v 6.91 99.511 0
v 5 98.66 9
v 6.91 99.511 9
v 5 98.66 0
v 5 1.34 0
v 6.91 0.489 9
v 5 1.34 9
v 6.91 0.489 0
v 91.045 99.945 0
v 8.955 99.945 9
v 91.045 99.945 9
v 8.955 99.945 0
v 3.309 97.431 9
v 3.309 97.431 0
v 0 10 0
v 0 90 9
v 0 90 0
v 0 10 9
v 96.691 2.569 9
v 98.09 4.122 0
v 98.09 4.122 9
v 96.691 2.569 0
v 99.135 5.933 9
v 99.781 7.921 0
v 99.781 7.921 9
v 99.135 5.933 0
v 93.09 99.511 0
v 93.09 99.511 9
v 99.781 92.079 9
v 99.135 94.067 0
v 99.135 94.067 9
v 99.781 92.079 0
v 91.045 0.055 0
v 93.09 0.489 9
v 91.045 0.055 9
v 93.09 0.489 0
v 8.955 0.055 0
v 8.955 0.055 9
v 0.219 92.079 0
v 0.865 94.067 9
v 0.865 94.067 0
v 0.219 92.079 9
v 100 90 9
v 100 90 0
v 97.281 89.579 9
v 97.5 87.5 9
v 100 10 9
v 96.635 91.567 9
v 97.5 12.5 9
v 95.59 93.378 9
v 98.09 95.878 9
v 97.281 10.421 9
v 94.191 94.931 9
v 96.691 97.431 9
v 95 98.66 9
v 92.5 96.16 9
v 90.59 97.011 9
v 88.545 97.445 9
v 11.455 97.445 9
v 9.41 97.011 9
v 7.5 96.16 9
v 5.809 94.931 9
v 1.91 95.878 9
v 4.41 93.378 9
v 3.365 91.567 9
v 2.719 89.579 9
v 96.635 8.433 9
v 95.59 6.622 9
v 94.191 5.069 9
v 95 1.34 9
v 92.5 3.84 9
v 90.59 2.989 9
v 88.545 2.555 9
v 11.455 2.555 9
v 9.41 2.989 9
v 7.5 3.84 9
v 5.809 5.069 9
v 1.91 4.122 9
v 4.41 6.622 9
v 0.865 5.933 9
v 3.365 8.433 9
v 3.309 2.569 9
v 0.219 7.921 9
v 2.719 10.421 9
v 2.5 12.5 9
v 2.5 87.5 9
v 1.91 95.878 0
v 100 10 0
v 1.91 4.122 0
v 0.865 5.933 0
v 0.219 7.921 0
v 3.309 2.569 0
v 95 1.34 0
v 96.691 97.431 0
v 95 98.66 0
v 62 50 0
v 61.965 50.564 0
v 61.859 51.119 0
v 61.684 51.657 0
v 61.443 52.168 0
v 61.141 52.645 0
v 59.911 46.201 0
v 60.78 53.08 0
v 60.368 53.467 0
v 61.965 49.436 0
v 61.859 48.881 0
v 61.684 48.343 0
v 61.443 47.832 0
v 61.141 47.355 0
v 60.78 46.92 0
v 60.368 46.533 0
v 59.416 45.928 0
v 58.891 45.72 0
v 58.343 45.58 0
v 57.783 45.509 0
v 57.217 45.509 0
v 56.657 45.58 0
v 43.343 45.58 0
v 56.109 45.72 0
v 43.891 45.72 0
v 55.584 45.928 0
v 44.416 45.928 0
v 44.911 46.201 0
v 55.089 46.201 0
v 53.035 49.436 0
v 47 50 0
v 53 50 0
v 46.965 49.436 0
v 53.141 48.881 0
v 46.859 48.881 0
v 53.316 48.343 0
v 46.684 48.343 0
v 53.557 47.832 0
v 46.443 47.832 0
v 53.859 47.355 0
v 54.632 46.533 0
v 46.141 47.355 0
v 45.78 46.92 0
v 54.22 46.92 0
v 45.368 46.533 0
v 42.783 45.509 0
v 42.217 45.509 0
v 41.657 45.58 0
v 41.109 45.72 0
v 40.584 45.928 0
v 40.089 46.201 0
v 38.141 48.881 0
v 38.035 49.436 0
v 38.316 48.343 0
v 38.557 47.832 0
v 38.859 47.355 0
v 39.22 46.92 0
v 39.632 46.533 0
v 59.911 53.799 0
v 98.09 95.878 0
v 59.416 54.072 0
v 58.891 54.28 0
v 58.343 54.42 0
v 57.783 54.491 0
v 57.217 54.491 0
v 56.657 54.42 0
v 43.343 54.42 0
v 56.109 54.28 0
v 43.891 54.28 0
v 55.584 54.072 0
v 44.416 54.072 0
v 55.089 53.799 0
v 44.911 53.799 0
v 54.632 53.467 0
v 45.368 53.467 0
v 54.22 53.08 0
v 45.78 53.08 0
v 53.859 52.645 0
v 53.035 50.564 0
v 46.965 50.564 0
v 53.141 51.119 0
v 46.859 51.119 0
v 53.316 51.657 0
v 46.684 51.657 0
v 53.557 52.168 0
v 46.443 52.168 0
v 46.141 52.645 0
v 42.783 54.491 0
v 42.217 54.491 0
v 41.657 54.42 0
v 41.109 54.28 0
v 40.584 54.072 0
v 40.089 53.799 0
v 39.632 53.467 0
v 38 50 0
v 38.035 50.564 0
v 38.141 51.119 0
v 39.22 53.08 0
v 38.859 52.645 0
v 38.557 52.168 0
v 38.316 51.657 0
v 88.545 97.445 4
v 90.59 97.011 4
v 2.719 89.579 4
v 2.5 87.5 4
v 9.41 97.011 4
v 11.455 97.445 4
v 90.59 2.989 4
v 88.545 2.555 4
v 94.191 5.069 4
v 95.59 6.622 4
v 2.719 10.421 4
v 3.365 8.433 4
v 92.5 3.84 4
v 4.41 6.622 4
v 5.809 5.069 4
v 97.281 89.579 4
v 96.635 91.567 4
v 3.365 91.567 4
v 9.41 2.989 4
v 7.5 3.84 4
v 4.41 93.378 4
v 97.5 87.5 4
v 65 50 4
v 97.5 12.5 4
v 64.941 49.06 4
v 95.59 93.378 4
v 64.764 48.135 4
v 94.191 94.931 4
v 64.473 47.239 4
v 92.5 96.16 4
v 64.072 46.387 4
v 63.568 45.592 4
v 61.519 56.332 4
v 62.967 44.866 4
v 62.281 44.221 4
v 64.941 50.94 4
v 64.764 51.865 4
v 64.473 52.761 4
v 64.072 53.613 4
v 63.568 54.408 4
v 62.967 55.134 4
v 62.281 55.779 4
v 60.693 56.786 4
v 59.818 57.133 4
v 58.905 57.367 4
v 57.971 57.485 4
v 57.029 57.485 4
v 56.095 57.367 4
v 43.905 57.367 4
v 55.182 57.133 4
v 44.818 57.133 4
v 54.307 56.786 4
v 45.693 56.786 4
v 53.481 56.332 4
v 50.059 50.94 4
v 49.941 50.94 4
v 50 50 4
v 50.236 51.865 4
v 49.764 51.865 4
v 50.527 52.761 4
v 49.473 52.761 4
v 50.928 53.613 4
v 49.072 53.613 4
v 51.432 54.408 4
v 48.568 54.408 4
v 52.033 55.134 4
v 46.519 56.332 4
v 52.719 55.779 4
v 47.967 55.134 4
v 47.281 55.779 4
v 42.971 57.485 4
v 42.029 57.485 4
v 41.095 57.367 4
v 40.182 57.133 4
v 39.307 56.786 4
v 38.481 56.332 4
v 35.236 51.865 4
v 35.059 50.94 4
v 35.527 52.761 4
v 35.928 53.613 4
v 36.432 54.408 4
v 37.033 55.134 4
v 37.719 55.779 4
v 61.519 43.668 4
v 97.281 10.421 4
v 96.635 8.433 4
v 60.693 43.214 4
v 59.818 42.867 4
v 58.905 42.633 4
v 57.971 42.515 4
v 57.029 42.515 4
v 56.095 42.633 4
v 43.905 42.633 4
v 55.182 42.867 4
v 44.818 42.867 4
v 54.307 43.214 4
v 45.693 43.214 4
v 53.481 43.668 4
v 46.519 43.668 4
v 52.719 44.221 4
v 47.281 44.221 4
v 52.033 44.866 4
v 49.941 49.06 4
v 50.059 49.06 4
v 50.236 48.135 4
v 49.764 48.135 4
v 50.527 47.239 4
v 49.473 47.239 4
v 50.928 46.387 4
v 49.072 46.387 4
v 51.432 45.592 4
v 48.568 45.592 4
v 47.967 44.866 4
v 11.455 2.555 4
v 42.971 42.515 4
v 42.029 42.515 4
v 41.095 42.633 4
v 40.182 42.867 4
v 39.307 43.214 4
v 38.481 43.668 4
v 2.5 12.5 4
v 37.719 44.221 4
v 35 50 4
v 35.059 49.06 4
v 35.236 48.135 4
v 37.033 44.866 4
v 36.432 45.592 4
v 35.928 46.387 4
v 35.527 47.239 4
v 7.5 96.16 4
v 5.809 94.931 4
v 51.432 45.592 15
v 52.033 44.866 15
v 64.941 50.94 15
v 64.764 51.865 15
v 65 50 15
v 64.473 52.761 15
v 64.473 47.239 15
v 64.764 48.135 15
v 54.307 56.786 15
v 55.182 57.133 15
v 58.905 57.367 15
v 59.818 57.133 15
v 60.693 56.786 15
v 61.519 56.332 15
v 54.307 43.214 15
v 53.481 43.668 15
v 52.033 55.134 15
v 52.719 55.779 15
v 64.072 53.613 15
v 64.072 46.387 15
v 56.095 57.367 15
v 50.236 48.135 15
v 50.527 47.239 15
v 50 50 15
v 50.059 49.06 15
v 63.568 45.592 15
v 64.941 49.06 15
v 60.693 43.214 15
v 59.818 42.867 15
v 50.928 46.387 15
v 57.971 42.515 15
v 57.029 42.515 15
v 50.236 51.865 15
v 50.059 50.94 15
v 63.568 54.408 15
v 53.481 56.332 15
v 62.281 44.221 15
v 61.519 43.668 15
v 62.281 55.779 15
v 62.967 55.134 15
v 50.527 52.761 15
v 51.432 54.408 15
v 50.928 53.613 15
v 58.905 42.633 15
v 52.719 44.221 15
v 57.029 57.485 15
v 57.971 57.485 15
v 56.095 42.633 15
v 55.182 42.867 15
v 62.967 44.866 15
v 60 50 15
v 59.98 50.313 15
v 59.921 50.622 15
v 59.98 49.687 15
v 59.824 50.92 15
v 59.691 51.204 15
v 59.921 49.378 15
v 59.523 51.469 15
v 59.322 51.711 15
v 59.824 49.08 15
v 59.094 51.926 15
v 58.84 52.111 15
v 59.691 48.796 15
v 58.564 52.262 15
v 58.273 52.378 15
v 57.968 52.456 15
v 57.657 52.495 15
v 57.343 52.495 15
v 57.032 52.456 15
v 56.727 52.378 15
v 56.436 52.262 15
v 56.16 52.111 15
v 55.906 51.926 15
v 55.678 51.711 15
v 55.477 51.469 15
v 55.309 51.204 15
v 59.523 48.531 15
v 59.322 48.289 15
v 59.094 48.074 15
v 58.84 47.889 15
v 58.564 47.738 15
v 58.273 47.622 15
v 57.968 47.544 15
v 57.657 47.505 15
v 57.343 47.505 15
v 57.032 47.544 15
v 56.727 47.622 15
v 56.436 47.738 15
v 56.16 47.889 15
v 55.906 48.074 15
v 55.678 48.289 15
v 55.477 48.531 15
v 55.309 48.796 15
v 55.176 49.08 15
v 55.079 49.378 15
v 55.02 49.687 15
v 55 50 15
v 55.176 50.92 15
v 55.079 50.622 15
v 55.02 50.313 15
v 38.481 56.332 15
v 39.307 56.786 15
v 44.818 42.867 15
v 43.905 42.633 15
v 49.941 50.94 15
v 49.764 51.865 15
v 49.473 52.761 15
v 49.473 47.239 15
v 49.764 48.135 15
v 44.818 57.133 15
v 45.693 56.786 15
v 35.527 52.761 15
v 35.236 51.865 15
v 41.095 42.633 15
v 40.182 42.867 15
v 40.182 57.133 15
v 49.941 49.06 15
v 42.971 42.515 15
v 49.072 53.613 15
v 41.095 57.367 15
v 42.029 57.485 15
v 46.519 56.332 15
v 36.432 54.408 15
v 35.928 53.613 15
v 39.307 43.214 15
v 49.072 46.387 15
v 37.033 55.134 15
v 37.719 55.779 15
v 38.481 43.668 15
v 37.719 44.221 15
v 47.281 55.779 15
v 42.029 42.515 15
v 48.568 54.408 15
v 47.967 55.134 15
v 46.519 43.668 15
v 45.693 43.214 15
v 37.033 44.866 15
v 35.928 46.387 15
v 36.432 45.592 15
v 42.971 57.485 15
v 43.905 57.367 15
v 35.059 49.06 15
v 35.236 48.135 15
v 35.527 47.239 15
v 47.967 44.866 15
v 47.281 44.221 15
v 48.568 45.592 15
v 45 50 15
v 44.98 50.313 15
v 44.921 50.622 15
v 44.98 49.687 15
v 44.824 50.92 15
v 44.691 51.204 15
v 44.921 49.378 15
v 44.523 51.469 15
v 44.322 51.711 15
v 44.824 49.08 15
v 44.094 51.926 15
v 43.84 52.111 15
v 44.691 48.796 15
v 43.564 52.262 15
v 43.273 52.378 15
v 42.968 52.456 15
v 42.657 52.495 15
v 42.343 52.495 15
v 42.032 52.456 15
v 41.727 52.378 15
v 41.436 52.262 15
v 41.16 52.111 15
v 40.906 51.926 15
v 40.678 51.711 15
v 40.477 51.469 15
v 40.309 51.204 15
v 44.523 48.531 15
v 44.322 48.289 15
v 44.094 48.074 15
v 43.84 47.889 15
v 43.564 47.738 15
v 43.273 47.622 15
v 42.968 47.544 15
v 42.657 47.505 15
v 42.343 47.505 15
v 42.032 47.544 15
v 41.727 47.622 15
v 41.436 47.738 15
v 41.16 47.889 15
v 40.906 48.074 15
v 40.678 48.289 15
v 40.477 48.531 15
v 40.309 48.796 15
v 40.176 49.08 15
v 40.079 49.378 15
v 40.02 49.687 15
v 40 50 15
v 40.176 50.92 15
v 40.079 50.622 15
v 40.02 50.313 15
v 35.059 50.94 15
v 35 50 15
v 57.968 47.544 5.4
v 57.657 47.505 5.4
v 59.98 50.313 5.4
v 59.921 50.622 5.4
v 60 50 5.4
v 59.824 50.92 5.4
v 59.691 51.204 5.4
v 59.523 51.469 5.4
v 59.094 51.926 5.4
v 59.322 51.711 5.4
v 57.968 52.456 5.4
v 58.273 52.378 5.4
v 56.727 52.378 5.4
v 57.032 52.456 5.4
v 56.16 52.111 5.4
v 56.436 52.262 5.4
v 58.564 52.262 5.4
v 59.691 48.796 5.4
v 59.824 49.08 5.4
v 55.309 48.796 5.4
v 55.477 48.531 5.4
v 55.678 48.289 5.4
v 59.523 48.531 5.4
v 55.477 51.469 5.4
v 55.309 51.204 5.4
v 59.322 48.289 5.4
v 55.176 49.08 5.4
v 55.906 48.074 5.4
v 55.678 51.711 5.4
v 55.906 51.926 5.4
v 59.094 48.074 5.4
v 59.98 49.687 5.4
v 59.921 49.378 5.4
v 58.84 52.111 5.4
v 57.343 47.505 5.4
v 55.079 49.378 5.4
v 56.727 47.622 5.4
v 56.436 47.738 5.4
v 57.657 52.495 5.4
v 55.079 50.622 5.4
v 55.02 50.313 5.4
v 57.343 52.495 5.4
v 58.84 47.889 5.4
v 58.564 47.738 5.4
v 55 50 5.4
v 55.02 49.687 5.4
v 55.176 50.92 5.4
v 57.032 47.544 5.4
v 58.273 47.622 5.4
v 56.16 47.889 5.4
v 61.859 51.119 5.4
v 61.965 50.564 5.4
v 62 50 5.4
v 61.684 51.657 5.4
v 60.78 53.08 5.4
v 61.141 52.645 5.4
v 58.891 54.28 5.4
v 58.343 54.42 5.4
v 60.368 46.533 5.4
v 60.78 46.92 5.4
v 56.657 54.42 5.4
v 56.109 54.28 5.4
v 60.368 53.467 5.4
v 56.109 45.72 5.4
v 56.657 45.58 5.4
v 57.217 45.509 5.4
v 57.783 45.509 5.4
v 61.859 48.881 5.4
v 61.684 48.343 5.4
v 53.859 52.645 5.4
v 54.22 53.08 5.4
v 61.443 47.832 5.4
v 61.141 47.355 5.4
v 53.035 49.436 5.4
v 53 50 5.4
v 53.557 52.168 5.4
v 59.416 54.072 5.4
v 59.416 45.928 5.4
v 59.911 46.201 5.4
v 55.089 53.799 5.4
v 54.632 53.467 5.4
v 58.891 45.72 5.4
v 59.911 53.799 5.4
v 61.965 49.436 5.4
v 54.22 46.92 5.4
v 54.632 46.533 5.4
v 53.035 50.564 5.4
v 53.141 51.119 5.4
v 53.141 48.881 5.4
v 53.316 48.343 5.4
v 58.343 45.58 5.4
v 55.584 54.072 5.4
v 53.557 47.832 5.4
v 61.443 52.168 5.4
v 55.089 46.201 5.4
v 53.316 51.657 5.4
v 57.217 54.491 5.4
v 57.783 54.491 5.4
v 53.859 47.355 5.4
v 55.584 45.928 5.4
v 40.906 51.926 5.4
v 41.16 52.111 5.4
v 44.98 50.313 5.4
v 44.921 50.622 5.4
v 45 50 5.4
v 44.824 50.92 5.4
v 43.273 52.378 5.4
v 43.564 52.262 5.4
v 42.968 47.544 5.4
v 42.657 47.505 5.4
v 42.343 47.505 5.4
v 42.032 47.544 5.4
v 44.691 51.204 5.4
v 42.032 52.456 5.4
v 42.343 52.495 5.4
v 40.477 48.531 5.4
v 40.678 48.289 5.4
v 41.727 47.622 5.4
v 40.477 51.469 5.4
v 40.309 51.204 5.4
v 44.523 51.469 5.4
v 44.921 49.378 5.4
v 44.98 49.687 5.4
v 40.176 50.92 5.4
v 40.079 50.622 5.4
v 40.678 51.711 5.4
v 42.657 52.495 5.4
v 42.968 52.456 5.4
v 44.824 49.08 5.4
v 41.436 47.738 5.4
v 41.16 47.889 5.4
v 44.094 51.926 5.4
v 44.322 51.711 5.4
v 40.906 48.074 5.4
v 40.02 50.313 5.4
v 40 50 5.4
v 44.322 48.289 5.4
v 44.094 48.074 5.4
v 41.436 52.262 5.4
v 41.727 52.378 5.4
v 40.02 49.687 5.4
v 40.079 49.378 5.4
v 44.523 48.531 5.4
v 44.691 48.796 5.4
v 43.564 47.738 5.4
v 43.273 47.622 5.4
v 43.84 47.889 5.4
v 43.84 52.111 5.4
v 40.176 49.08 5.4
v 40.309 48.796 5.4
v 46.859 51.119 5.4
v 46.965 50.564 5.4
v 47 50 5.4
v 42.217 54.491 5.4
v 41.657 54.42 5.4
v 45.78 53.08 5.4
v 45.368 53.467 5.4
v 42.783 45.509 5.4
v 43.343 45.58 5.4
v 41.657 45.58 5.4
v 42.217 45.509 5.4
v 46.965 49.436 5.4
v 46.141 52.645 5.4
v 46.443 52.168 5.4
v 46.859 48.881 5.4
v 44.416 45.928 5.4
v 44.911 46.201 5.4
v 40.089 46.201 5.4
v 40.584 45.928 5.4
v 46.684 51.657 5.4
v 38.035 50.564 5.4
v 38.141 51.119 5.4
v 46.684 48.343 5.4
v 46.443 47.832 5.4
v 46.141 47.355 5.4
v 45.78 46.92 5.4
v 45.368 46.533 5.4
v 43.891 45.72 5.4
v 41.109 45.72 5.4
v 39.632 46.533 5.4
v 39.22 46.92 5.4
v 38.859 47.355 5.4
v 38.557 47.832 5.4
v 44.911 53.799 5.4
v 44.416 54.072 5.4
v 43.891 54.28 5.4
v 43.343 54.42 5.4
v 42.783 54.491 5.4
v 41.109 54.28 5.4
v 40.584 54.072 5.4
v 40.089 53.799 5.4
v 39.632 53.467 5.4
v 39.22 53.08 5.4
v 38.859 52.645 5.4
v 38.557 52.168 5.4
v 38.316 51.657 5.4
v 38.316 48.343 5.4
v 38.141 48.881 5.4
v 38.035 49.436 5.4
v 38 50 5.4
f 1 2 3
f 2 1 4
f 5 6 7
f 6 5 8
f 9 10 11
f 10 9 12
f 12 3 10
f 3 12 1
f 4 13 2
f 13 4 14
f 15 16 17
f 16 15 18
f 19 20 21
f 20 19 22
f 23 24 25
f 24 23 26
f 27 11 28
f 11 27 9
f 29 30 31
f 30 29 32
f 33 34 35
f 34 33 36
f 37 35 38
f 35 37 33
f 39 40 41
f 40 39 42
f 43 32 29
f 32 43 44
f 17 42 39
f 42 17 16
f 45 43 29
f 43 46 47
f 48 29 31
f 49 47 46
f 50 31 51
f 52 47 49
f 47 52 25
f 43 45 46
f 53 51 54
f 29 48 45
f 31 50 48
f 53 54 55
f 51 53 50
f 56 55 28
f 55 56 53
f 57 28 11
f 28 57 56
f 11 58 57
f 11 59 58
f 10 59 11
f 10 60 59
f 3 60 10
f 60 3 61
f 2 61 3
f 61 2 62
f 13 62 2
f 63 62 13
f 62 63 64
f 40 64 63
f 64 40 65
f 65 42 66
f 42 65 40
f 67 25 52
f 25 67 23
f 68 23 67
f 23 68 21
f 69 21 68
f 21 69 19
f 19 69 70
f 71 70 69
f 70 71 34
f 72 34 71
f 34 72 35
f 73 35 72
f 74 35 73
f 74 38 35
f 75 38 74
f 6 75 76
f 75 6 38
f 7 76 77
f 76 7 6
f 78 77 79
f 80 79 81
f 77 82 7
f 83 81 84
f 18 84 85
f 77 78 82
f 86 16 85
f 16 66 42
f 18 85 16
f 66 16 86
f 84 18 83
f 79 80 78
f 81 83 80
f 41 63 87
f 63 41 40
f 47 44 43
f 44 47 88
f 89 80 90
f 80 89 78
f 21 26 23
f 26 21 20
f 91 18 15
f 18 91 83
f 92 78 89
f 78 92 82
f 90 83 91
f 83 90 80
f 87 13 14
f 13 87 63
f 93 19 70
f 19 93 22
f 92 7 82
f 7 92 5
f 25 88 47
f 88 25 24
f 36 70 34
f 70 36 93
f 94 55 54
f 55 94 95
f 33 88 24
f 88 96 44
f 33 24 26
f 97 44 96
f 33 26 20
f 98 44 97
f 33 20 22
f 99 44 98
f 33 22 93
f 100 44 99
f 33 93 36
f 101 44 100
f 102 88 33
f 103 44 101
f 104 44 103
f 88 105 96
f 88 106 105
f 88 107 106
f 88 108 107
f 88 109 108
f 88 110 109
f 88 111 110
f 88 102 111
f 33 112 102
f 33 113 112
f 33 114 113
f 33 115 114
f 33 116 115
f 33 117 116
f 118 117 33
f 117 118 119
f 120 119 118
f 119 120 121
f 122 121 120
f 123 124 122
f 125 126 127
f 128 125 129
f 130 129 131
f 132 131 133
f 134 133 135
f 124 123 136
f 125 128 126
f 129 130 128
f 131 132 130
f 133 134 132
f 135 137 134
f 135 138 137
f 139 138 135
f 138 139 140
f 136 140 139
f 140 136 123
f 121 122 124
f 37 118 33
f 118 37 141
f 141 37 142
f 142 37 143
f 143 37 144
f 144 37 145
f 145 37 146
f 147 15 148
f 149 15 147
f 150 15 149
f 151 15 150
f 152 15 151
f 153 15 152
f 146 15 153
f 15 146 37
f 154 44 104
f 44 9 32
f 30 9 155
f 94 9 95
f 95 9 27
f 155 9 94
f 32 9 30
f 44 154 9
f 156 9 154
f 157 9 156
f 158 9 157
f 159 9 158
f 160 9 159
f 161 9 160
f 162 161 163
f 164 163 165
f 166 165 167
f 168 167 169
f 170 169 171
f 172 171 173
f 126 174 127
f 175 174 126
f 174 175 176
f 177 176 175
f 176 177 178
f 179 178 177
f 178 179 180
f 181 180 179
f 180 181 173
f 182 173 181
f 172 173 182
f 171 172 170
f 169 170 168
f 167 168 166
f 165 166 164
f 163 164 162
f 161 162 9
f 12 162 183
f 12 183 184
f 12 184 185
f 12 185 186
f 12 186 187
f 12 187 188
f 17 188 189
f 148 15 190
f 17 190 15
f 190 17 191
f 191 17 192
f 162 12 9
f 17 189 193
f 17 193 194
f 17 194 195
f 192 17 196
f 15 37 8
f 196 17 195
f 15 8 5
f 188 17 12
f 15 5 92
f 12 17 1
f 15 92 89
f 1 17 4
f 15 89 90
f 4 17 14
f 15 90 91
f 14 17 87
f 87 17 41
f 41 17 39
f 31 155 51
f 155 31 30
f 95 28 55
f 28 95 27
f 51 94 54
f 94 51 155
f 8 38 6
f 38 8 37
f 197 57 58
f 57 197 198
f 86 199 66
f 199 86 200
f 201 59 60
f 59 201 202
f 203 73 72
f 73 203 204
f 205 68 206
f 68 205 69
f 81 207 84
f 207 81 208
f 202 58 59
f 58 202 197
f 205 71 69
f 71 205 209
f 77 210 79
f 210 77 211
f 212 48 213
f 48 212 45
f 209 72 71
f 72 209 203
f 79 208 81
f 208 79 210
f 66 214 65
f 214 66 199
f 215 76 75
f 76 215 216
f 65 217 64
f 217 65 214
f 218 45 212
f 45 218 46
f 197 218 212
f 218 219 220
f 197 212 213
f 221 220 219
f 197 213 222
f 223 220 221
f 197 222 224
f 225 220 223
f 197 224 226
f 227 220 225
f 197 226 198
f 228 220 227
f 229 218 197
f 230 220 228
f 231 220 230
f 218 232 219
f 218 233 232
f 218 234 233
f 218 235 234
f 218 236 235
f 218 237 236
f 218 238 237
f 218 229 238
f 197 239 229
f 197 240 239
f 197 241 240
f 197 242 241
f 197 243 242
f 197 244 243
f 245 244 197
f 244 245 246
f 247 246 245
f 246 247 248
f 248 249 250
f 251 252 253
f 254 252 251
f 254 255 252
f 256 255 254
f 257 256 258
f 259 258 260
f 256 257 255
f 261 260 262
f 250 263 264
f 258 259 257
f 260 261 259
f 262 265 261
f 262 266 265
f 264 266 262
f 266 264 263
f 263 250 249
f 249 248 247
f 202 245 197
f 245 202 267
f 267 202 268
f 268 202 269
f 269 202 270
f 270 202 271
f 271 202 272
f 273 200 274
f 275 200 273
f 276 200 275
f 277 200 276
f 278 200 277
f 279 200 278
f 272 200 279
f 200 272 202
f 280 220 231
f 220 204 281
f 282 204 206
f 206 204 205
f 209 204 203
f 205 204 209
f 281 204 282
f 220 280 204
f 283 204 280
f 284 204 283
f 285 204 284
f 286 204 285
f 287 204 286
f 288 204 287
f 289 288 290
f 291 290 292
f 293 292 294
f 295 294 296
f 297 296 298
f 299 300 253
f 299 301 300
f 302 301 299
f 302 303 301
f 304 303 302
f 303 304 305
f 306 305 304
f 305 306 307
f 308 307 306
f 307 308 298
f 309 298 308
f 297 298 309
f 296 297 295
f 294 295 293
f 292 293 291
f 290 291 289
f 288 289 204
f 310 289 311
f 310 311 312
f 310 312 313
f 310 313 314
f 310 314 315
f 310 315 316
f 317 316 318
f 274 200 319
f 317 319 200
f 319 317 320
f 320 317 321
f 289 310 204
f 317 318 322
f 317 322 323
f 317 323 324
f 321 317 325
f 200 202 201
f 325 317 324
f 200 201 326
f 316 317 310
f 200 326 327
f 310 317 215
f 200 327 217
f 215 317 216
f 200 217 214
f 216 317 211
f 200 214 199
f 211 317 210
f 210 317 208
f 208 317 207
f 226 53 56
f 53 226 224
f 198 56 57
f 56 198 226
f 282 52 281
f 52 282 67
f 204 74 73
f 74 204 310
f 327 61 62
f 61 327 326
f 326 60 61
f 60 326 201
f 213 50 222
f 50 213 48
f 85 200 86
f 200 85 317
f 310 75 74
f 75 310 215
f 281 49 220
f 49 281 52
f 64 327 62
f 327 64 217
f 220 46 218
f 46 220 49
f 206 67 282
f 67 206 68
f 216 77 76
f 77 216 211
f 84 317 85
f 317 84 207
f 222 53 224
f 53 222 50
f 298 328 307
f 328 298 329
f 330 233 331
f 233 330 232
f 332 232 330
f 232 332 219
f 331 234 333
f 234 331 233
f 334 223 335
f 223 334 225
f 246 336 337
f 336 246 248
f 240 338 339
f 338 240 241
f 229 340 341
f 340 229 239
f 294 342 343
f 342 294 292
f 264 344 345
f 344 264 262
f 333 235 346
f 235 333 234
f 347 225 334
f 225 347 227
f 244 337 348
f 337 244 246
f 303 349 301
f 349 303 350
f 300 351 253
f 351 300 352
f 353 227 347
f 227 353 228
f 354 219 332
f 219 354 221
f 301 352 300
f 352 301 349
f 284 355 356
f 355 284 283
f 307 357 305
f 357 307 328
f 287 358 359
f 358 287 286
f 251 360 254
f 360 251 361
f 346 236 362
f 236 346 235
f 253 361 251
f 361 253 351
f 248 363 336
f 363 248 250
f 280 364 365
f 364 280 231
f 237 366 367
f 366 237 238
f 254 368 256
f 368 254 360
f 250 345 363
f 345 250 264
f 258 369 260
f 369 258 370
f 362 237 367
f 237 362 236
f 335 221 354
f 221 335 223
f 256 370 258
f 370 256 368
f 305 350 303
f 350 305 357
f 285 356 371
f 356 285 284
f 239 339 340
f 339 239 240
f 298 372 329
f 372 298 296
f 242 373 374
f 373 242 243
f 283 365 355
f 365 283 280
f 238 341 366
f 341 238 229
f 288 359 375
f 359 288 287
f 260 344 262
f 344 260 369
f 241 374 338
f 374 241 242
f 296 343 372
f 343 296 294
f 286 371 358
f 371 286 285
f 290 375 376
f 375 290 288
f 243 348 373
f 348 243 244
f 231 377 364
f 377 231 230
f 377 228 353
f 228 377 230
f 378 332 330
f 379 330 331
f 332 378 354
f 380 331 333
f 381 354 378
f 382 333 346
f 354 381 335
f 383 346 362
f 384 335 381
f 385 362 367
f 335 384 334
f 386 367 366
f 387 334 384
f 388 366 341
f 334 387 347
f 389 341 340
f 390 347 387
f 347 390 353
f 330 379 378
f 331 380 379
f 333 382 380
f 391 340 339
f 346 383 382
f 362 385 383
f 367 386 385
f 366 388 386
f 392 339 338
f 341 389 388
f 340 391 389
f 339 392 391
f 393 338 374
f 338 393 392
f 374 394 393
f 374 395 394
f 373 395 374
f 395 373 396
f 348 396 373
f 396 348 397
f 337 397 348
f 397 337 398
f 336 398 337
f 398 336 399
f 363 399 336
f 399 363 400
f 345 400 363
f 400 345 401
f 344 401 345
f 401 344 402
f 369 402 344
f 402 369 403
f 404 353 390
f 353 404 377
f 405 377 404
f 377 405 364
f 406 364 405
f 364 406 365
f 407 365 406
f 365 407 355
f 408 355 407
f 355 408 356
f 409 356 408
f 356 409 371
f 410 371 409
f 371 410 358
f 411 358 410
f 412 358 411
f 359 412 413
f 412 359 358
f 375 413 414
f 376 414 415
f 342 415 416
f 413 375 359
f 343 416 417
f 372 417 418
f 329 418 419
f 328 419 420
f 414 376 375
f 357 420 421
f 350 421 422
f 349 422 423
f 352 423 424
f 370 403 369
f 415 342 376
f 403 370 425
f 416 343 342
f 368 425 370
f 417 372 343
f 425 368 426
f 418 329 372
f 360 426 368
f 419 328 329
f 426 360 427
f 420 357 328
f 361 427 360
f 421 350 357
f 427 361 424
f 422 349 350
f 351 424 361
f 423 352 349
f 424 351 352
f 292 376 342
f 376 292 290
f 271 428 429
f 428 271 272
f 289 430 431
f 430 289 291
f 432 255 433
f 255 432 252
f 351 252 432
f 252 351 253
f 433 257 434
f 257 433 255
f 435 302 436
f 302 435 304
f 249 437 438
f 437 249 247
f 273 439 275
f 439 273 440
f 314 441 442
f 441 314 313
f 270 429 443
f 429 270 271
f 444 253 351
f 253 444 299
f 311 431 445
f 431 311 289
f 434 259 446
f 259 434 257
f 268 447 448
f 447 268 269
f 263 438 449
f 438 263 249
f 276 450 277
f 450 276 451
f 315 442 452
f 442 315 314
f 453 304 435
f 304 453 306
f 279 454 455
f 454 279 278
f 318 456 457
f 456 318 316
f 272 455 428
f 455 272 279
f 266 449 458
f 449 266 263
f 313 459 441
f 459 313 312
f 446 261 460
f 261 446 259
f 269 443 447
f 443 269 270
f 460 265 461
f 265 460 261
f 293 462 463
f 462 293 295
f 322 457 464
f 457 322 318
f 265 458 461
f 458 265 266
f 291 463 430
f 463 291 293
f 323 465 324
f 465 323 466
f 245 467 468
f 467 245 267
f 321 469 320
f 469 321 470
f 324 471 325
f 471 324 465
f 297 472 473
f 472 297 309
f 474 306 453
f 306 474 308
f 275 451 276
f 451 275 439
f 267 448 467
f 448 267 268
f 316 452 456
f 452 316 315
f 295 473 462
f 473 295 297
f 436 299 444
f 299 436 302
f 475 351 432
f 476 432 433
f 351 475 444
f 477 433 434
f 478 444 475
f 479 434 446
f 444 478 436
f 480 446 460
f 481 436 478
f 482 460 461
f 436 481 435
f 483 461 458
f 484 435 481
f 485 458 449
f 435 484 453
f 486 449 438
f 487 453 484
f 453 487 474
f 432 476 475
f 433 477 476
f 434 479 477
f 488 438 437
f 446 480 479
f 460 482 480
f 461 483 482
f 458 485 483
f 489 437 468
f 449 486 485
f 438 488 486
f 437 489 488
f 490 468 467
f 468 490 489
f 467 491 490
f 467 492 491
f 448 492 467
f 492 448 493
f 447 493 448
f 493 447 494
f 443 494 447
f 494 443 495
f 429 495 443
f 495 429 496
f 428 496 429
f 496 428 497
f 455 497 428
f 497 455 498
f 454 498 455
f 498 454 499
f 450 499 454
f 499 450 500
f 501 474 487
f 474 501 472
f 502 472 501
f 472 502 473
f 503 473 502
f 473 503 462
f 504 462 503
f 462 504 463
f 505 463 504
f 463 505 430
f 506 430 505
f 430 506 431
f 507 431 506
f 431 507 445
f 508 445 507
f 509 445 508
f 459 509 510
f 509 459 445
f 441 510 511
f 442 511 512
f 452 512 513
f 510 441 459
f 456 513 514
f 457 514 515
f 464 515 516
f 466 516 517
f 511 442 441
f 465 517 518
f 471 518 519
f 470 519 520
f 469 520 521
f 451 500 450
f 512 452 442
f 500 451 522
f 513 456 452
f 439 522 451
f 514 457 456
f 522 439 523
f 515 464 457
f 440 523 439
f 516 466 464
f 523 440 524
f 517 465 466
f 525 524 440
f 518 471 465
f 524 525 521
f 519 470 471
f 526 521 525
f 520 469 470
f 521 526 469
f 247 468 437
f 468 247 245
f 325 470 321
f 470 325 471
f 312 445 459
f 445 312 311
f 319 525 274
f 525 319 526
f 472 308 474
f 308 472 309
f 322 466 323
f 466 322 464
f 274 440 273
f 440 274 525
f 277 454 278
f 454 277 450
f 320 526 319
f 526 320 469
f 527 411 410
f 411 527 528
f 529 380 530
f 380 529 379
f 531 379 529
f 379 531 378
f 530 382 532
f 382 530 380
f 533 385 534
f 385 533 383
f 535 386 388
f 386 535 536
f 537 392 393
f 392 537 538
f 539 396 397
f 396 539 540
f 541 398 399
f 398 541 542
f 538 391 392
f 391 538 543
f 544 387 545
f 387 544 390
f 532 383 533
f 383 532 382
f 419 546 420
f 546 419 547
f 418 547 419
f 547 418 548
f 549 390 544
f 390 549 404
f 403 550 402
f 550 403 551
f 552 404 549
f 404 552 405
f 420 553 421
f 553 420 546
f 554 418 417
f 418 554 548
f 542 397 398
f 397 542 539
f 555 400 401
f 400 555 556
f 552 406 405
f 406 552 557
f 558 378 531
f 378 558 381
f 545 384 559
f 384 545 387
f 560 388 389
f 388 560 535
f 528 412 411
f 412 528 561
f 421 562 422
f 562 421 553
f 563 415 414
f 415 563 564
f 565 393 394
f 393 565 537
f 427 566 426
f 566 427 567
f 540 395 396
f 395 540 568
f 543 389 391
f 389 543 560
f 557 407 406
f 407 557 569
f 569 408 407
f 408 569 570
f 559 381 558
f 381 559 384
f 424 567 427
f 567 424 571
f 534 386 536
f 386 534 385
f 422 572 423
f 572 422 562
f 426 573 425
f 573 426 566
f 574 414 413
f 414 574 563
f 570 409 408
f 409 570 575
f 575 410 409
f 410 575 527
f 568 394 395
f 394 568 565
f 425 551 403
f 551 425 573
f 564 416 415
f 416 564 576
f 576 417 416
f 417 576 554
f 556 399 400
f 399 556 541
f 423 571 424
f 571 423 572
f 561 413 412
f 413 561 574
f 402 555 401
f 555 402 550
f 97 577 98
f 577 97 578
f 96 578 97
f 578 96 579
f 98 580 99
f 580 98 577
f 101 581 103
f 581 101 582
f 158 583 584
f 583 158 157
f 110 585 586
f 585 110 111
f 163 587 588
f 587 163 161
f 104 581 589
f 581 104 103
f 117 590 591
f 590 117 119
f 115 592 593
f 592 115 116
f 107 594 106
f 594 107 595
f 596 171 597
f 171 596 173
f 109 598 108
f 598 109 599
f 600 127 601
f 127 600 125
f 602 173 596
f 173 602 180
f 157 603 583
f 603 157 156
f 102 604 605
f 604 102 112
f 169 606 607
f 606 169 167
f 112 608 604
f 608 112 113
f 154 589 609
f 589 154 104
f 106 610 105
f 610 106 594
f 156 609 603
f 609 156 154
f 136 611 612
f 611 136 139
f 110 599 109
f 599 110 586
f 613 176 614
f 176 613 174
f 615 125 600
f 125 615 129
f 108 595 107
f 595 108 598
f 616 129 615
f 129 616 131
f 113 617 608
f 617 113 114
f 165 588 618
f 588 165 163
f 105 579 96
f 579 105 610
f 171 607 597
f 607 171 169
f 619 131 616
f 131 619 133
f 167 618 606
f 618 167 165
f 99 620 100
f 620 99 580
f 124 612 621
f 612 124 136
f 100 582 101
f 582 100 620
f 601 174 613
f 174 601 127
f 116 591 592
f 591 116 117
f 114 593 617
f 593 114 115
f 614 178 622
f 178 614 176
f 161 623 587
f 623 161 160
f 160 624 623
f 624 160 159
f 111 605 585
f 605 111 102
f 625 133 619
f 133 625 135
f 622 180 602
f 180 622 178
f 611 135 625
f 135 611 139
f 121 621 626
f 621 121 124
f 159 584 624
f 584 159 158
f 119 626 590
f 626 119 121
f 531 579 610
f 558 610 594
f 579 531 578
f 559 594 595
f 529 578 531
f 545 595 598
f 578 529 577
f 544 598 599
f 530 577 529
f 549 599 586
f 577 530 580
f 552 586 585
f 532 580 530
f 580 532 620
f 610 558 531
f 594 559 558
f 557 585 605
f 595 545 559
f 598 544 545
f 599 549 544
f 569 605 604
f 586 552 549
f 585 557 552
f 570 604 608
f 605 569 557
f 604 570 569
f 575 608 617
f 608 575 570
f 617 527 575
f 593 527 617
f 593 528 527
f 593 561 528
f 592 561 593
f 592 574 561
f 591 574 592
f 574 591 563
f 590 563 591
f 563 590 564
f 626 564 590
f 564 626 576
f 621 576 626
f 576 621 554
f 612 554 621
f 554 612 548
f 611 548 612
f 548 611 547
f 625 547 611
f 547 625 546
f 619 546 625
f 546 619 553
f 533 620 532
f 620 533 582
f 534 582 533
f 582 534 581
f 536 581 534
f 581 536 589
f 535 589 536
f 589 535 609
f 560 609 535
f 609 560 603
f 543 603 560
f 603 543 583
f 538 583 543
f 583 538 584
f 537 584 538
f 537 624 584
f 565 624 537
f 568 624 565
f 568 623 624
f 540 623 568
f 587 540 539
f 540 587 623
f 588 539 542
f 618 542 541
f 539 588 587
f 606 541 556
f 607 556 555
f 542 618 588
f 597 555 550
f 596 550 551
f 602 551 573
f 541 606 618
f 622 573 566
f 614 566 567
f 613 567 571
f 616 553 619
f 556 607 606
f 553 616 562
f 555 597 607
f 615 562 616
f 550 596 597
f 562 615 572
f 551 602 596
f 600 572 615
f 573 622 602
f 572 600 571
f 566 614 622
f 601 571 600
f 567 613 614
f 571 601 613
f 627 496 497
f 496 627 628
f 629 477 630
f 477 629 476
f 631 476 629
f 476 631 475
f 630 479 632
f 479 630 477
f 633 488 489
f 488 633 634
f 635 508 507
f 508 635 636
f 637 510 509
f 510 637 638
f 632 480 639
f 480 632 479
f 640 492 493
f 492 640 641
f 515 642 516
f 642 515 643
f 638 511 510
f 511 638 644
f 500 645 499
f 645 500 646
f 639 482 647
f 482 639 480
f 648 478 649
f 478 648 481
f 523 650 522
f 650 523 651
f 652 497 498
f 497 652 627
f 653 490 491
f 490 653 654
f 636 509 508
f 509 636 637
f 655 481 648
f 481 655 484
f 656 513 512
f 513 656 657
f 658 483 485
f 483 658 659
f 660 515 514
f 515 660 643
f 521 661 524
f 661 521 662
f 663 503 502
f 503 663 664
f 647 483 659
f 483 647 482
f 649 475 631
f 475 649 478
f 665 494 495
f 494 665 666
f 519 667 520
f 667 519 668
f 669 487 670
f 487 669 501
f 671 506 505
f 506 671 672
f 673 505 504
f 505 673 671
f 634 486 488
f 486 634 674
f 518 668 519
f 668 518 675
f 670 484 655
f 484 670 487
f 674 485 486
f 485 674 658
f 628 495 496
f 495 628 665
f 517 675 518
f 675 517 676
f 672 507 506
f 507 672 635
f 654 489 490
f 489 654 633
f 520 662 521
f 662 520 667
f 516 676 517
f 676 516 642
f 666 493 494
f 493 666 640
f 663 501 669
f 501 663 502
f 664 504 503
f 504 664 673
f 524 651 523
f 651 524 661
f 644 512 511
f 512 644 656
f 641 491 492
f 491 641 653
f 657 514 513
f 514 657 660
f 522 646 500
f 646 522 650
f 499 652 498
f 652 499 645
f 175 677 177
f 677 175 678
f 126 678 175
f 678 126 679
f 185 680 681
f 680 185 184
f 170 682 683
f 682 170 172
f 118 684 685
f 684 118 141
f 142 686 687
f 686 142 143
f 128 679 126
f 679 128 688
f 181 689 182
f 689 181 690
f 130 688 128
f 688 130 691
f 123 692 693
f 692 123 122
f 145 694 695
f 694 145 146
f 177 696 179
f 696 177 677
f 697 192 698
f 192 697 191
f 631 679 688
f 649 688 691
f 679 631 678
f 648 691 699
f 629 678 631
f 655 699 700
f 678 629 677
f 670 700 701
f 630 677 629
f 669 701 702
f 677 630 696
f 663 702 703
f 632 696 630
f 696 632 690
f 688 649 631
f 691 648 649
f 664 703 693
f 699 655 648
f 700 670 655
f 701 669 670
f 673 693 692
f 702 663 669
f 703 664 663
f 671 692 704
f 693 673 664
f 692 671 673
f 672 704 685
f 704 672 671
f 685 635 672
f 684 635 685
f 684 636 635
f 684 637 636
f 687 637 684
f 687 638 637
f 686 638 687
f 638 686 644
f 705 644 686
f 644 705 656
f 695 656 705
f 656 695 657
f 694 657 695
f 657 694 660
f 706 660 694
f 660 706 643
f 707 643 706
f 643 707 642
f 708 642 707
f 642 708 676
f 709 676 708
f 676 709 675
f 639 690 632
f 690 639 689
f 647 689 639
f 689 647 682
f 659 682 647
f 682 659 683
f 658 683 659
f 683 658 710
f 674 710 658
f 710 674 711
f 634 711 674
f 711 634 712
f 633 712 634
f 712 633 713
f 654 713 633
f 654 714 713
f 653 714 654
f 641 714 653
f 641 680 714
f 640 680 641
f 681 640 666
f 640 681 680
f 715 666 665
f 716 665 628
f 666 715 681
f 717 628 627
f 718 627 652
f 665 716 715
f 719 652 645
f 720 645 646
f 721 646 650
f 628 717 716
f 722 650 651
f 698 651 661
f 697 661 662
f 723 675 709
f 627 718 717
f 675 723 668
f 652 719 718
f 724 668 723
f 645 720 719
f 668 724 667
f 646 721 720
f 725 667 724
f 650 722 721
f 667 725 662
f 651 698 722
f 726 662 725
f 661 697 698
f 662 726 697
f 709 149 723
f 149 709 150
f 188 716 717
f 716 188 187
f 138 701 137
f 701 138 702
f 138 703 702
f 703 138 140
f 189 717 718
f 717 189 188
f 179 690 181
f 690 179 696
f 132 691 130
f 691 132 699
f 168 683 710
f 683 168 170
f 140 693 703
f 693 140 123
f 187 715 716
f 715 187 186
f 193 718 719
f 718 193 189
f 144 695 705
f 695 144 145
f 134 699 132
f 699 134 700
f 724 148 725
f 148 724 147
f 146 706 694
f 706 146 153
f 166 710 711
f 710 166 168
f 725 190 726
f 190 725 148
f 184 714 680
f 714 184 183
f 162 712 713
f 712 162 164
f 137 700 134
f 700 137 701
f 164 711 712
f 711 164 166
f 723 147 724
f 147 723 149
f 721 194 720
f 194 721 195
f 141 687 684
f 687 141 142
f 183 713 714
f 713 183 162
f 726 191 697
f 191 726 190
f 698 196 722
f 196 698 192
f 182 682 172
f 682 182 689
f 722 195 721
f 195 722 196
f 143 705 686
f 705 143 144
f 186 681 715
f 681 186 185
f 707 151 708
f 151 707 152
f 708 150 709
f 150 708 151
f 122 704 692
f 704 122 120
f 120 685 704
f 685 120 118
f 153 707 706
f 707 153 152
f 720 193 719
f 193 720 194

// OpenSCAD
// file: LoadCellRx.scad
/* TAL220 Load Cell Rx - Receives cable (base) end of TAL220
    Copyright (C) 2019 Benjamin Hubbard

    This program is free software: you can redistribute it and/or modify
    it under the terms of the GNU General Public License as published by
    the Free Software Foundation, either version 3 of the License, or
    (at your option) any later version.

    This program is distributed in the hope that it will be useful,
    but WITHOUT ANY WARRANTY; without even the implied warranty of
    MERCHANTABILITY or FITNESS FOR A PARTICULAR PURPOSE.  See the
    GNU General Public License for more details.

    You should have received a copy of the GNU General Public License
    along with this program.  If not, see <https://www.gnu.org/licenses/>.
 */
 
 
// General resolution.
$fn = 50;


// Place samples.
translate([-10, -10, 0])TAL220("M4");
translate([-10, 10, 0])TAL220("M5");
translate([20, 10, 0])TAL221();

translate([-10, -30, 0])TAL220("M4", 2);
translate([-10, 30, 0])TAL220("M5", 2);
translate([20, -10, 0])TAL221(2);


// Nut cutout.
// E = corner to corner.
E_M3 = 6.2; // M3: 6.01-6.35
E_M4 = 9; // M4: 7.66-8.08  
E_M5 = 10; // M5: 8.79-9.24

// M = thickness.
M_M3 = 2.4;  // M3: 2.15-2.40
M_M4 = 4.4;  //M4: 2.90-3.20 Screw head height = 4
M_M5 = 5.4; // M5: 4.40-4.70 Screw head height = 5


// Thru hole diameters (M4 or M5).
diam_M3  = 4; //3.5;
diam_M4 = 5; //4.5;
diam_M5 = 6.25; //5.5;


// Screw locations.
holeX_220 = [7.5, -7.5];
holeY_220 = [0, 0];

holeX_221 = [0, 0];
holeY_221 = [-3, 3];


// Large beam strain gage.
module TAL220(MX, Cutout) {
  // 0 = Full stand-off.
  // 1 = Solid Boss.
  // 2 = Screw Cutout.
  if (is_undef(Cutout) || Cutout == 0) {
    if (MX == "M4") {
      Rx(E_M4, M_M4, holeX_220, holeY_220, diam_M4);     
    }

    if (MX == "M5") {     
      Rx(E_M5, M_M5, holeX_220, holeY_220, diam_M5);
    }
  }

  if (Cutout == 1) {
    if (MX == "M4") {
      RxBoss(holeX_220, holeY_220, E_M4);
    }

    if (MX == "M5") {
      RxBoss(holeX_220, holeY_220, E_M5);
    }
  } 
  
  if (Cutout == 2) {
    if (MX == "M4") {
      RxThruHole(E_M4, M_M5, holeX_220, holeY_220, diam_M4);
    }

    if (MX == "M5") {
      RxThruHole(E_M5, M_M5, holeX_220, holeY_220, diam_M5);
    }
  } 
}


// Small beam strain gage.
module TAL221(Cutout) {
  if (is_undef(Cutout) || Cutout == 0) {
    Rx(E_M3, M_M3, holeX_221, holeY_221, diam_M3);
  } 

  if (Cutout == 1) {
    RxBoss(holeX_221, holeY_221, E_M3);
  }
  
  if (Cutout == 2) {
    RxThruHole(E_M3, M_M3, holeX_221, holeY_221, diam_M3);
  }
}


// Building Blocks.
// Boss for screw to pass through.
module RxBoss(holeX, holeY, E){
  for (i=[0:1]) {
    translate([holeX[i], holeY[i], 0])cylinder(d = E+6, h = 15);
  }
}


// Through hole (holds screw and nut).
module RxThruHole(E, M, holeX, holeY, diam) {
  // Thru hole
  for (i=[0:1]) {
    translate([holeX[i], holeY[i], 0])cylinder(d = diam, h = 15);

    // Nut receiver
    translate([holeX[i], holeY[i], 0])cylinder(d = E, h = M);//, $fn=6);
  }
}


// Build the full receiver (thru hole cut out of boss).
module Rx(E, M, holeX, holeY, diam) {
  translate([0, 0, 0])difference() { 
    RxBoss(holeX, holeY, E);
    RxThruHole(E, M, holeX, holeY, diam);
  }
}
// main file
/* OS Nano Balance - Bed: Accepts mass, connects to load cells
    Copyright (C) 2019 Benjamin Hubbard

    This program is free software: you can redistribute it and/or modify
    it under the terms of the GNU General Public License as published by
    the Free Software Foundation, either version 3 of the License, or
    (at your option) any later version.

    This program is distributed in the hope that it will be useful,
    but WITHOUT ANY WARRANTY; without even the implied warranty of
    MERCHANTABILITY or FITNESS FOR A PARTICULAR PURPOSE.  See the
    GNU General Public License for more details.

    You should have received a copy of the GNU General Public License
    along with this program.  If not, see <https://www.gnu.org/licenses/>.
*/
 
// Library of LoadCell receivers.
use <LoadCellRx.scad>;

// Bed dimensions.
minkowskiDim = [10, 10, 1];
oDim = [100, 100, 10]; //[150, 150, 10];
iDim = [95, 95, 6]; //[144, 144, 6];
// Dimensional difference - for placement.
diff = oDim - iDim;

// Make the main body.
difference(){
  union(){
    translate([minkowskiDim[0], minkowskiDim[1], 0])difference(){
      minkowski(){
        cube(oDim - minkowskiDim*2);
        cylinder(r = minkowskiDim[0], h = minkowskiDim[2]);
      }
      minkowski(){
        translate([diff[0]/2, diff[1]/2, diff[2]])cube(iDim - minkowskiDim*2);
        cylinder(r = minkowskiDim[0], h = minkowskiDim[2]*2);
      }
    }
    // Place the TAL221 at the center. The top of the hex cutout is at the origin of the Rx unit.
    //translate([oDim[0]/2, oDim[1]/2, 0])TAL221(1);
     
    // Place the TAL220 at the center. It's sized so that it fits around the TAL221.
    translate([oDim[0]/2, oDim[1]/2, 0])TAL220("M4", 1);
  }
     
  // Place the TAL221 at the center. The top of the hex cutout is at the origin of the Rx unit.
  //translate([oDim[0]/2, oDim[1]/2, 0])TAL221(2);
   
  // Place the TAL220 at the center. It's sized so that it fits around the TAL221.
  translate([oDim[0]/2, oDim[1]/2, 0])TAL220("M4", 2);
}
